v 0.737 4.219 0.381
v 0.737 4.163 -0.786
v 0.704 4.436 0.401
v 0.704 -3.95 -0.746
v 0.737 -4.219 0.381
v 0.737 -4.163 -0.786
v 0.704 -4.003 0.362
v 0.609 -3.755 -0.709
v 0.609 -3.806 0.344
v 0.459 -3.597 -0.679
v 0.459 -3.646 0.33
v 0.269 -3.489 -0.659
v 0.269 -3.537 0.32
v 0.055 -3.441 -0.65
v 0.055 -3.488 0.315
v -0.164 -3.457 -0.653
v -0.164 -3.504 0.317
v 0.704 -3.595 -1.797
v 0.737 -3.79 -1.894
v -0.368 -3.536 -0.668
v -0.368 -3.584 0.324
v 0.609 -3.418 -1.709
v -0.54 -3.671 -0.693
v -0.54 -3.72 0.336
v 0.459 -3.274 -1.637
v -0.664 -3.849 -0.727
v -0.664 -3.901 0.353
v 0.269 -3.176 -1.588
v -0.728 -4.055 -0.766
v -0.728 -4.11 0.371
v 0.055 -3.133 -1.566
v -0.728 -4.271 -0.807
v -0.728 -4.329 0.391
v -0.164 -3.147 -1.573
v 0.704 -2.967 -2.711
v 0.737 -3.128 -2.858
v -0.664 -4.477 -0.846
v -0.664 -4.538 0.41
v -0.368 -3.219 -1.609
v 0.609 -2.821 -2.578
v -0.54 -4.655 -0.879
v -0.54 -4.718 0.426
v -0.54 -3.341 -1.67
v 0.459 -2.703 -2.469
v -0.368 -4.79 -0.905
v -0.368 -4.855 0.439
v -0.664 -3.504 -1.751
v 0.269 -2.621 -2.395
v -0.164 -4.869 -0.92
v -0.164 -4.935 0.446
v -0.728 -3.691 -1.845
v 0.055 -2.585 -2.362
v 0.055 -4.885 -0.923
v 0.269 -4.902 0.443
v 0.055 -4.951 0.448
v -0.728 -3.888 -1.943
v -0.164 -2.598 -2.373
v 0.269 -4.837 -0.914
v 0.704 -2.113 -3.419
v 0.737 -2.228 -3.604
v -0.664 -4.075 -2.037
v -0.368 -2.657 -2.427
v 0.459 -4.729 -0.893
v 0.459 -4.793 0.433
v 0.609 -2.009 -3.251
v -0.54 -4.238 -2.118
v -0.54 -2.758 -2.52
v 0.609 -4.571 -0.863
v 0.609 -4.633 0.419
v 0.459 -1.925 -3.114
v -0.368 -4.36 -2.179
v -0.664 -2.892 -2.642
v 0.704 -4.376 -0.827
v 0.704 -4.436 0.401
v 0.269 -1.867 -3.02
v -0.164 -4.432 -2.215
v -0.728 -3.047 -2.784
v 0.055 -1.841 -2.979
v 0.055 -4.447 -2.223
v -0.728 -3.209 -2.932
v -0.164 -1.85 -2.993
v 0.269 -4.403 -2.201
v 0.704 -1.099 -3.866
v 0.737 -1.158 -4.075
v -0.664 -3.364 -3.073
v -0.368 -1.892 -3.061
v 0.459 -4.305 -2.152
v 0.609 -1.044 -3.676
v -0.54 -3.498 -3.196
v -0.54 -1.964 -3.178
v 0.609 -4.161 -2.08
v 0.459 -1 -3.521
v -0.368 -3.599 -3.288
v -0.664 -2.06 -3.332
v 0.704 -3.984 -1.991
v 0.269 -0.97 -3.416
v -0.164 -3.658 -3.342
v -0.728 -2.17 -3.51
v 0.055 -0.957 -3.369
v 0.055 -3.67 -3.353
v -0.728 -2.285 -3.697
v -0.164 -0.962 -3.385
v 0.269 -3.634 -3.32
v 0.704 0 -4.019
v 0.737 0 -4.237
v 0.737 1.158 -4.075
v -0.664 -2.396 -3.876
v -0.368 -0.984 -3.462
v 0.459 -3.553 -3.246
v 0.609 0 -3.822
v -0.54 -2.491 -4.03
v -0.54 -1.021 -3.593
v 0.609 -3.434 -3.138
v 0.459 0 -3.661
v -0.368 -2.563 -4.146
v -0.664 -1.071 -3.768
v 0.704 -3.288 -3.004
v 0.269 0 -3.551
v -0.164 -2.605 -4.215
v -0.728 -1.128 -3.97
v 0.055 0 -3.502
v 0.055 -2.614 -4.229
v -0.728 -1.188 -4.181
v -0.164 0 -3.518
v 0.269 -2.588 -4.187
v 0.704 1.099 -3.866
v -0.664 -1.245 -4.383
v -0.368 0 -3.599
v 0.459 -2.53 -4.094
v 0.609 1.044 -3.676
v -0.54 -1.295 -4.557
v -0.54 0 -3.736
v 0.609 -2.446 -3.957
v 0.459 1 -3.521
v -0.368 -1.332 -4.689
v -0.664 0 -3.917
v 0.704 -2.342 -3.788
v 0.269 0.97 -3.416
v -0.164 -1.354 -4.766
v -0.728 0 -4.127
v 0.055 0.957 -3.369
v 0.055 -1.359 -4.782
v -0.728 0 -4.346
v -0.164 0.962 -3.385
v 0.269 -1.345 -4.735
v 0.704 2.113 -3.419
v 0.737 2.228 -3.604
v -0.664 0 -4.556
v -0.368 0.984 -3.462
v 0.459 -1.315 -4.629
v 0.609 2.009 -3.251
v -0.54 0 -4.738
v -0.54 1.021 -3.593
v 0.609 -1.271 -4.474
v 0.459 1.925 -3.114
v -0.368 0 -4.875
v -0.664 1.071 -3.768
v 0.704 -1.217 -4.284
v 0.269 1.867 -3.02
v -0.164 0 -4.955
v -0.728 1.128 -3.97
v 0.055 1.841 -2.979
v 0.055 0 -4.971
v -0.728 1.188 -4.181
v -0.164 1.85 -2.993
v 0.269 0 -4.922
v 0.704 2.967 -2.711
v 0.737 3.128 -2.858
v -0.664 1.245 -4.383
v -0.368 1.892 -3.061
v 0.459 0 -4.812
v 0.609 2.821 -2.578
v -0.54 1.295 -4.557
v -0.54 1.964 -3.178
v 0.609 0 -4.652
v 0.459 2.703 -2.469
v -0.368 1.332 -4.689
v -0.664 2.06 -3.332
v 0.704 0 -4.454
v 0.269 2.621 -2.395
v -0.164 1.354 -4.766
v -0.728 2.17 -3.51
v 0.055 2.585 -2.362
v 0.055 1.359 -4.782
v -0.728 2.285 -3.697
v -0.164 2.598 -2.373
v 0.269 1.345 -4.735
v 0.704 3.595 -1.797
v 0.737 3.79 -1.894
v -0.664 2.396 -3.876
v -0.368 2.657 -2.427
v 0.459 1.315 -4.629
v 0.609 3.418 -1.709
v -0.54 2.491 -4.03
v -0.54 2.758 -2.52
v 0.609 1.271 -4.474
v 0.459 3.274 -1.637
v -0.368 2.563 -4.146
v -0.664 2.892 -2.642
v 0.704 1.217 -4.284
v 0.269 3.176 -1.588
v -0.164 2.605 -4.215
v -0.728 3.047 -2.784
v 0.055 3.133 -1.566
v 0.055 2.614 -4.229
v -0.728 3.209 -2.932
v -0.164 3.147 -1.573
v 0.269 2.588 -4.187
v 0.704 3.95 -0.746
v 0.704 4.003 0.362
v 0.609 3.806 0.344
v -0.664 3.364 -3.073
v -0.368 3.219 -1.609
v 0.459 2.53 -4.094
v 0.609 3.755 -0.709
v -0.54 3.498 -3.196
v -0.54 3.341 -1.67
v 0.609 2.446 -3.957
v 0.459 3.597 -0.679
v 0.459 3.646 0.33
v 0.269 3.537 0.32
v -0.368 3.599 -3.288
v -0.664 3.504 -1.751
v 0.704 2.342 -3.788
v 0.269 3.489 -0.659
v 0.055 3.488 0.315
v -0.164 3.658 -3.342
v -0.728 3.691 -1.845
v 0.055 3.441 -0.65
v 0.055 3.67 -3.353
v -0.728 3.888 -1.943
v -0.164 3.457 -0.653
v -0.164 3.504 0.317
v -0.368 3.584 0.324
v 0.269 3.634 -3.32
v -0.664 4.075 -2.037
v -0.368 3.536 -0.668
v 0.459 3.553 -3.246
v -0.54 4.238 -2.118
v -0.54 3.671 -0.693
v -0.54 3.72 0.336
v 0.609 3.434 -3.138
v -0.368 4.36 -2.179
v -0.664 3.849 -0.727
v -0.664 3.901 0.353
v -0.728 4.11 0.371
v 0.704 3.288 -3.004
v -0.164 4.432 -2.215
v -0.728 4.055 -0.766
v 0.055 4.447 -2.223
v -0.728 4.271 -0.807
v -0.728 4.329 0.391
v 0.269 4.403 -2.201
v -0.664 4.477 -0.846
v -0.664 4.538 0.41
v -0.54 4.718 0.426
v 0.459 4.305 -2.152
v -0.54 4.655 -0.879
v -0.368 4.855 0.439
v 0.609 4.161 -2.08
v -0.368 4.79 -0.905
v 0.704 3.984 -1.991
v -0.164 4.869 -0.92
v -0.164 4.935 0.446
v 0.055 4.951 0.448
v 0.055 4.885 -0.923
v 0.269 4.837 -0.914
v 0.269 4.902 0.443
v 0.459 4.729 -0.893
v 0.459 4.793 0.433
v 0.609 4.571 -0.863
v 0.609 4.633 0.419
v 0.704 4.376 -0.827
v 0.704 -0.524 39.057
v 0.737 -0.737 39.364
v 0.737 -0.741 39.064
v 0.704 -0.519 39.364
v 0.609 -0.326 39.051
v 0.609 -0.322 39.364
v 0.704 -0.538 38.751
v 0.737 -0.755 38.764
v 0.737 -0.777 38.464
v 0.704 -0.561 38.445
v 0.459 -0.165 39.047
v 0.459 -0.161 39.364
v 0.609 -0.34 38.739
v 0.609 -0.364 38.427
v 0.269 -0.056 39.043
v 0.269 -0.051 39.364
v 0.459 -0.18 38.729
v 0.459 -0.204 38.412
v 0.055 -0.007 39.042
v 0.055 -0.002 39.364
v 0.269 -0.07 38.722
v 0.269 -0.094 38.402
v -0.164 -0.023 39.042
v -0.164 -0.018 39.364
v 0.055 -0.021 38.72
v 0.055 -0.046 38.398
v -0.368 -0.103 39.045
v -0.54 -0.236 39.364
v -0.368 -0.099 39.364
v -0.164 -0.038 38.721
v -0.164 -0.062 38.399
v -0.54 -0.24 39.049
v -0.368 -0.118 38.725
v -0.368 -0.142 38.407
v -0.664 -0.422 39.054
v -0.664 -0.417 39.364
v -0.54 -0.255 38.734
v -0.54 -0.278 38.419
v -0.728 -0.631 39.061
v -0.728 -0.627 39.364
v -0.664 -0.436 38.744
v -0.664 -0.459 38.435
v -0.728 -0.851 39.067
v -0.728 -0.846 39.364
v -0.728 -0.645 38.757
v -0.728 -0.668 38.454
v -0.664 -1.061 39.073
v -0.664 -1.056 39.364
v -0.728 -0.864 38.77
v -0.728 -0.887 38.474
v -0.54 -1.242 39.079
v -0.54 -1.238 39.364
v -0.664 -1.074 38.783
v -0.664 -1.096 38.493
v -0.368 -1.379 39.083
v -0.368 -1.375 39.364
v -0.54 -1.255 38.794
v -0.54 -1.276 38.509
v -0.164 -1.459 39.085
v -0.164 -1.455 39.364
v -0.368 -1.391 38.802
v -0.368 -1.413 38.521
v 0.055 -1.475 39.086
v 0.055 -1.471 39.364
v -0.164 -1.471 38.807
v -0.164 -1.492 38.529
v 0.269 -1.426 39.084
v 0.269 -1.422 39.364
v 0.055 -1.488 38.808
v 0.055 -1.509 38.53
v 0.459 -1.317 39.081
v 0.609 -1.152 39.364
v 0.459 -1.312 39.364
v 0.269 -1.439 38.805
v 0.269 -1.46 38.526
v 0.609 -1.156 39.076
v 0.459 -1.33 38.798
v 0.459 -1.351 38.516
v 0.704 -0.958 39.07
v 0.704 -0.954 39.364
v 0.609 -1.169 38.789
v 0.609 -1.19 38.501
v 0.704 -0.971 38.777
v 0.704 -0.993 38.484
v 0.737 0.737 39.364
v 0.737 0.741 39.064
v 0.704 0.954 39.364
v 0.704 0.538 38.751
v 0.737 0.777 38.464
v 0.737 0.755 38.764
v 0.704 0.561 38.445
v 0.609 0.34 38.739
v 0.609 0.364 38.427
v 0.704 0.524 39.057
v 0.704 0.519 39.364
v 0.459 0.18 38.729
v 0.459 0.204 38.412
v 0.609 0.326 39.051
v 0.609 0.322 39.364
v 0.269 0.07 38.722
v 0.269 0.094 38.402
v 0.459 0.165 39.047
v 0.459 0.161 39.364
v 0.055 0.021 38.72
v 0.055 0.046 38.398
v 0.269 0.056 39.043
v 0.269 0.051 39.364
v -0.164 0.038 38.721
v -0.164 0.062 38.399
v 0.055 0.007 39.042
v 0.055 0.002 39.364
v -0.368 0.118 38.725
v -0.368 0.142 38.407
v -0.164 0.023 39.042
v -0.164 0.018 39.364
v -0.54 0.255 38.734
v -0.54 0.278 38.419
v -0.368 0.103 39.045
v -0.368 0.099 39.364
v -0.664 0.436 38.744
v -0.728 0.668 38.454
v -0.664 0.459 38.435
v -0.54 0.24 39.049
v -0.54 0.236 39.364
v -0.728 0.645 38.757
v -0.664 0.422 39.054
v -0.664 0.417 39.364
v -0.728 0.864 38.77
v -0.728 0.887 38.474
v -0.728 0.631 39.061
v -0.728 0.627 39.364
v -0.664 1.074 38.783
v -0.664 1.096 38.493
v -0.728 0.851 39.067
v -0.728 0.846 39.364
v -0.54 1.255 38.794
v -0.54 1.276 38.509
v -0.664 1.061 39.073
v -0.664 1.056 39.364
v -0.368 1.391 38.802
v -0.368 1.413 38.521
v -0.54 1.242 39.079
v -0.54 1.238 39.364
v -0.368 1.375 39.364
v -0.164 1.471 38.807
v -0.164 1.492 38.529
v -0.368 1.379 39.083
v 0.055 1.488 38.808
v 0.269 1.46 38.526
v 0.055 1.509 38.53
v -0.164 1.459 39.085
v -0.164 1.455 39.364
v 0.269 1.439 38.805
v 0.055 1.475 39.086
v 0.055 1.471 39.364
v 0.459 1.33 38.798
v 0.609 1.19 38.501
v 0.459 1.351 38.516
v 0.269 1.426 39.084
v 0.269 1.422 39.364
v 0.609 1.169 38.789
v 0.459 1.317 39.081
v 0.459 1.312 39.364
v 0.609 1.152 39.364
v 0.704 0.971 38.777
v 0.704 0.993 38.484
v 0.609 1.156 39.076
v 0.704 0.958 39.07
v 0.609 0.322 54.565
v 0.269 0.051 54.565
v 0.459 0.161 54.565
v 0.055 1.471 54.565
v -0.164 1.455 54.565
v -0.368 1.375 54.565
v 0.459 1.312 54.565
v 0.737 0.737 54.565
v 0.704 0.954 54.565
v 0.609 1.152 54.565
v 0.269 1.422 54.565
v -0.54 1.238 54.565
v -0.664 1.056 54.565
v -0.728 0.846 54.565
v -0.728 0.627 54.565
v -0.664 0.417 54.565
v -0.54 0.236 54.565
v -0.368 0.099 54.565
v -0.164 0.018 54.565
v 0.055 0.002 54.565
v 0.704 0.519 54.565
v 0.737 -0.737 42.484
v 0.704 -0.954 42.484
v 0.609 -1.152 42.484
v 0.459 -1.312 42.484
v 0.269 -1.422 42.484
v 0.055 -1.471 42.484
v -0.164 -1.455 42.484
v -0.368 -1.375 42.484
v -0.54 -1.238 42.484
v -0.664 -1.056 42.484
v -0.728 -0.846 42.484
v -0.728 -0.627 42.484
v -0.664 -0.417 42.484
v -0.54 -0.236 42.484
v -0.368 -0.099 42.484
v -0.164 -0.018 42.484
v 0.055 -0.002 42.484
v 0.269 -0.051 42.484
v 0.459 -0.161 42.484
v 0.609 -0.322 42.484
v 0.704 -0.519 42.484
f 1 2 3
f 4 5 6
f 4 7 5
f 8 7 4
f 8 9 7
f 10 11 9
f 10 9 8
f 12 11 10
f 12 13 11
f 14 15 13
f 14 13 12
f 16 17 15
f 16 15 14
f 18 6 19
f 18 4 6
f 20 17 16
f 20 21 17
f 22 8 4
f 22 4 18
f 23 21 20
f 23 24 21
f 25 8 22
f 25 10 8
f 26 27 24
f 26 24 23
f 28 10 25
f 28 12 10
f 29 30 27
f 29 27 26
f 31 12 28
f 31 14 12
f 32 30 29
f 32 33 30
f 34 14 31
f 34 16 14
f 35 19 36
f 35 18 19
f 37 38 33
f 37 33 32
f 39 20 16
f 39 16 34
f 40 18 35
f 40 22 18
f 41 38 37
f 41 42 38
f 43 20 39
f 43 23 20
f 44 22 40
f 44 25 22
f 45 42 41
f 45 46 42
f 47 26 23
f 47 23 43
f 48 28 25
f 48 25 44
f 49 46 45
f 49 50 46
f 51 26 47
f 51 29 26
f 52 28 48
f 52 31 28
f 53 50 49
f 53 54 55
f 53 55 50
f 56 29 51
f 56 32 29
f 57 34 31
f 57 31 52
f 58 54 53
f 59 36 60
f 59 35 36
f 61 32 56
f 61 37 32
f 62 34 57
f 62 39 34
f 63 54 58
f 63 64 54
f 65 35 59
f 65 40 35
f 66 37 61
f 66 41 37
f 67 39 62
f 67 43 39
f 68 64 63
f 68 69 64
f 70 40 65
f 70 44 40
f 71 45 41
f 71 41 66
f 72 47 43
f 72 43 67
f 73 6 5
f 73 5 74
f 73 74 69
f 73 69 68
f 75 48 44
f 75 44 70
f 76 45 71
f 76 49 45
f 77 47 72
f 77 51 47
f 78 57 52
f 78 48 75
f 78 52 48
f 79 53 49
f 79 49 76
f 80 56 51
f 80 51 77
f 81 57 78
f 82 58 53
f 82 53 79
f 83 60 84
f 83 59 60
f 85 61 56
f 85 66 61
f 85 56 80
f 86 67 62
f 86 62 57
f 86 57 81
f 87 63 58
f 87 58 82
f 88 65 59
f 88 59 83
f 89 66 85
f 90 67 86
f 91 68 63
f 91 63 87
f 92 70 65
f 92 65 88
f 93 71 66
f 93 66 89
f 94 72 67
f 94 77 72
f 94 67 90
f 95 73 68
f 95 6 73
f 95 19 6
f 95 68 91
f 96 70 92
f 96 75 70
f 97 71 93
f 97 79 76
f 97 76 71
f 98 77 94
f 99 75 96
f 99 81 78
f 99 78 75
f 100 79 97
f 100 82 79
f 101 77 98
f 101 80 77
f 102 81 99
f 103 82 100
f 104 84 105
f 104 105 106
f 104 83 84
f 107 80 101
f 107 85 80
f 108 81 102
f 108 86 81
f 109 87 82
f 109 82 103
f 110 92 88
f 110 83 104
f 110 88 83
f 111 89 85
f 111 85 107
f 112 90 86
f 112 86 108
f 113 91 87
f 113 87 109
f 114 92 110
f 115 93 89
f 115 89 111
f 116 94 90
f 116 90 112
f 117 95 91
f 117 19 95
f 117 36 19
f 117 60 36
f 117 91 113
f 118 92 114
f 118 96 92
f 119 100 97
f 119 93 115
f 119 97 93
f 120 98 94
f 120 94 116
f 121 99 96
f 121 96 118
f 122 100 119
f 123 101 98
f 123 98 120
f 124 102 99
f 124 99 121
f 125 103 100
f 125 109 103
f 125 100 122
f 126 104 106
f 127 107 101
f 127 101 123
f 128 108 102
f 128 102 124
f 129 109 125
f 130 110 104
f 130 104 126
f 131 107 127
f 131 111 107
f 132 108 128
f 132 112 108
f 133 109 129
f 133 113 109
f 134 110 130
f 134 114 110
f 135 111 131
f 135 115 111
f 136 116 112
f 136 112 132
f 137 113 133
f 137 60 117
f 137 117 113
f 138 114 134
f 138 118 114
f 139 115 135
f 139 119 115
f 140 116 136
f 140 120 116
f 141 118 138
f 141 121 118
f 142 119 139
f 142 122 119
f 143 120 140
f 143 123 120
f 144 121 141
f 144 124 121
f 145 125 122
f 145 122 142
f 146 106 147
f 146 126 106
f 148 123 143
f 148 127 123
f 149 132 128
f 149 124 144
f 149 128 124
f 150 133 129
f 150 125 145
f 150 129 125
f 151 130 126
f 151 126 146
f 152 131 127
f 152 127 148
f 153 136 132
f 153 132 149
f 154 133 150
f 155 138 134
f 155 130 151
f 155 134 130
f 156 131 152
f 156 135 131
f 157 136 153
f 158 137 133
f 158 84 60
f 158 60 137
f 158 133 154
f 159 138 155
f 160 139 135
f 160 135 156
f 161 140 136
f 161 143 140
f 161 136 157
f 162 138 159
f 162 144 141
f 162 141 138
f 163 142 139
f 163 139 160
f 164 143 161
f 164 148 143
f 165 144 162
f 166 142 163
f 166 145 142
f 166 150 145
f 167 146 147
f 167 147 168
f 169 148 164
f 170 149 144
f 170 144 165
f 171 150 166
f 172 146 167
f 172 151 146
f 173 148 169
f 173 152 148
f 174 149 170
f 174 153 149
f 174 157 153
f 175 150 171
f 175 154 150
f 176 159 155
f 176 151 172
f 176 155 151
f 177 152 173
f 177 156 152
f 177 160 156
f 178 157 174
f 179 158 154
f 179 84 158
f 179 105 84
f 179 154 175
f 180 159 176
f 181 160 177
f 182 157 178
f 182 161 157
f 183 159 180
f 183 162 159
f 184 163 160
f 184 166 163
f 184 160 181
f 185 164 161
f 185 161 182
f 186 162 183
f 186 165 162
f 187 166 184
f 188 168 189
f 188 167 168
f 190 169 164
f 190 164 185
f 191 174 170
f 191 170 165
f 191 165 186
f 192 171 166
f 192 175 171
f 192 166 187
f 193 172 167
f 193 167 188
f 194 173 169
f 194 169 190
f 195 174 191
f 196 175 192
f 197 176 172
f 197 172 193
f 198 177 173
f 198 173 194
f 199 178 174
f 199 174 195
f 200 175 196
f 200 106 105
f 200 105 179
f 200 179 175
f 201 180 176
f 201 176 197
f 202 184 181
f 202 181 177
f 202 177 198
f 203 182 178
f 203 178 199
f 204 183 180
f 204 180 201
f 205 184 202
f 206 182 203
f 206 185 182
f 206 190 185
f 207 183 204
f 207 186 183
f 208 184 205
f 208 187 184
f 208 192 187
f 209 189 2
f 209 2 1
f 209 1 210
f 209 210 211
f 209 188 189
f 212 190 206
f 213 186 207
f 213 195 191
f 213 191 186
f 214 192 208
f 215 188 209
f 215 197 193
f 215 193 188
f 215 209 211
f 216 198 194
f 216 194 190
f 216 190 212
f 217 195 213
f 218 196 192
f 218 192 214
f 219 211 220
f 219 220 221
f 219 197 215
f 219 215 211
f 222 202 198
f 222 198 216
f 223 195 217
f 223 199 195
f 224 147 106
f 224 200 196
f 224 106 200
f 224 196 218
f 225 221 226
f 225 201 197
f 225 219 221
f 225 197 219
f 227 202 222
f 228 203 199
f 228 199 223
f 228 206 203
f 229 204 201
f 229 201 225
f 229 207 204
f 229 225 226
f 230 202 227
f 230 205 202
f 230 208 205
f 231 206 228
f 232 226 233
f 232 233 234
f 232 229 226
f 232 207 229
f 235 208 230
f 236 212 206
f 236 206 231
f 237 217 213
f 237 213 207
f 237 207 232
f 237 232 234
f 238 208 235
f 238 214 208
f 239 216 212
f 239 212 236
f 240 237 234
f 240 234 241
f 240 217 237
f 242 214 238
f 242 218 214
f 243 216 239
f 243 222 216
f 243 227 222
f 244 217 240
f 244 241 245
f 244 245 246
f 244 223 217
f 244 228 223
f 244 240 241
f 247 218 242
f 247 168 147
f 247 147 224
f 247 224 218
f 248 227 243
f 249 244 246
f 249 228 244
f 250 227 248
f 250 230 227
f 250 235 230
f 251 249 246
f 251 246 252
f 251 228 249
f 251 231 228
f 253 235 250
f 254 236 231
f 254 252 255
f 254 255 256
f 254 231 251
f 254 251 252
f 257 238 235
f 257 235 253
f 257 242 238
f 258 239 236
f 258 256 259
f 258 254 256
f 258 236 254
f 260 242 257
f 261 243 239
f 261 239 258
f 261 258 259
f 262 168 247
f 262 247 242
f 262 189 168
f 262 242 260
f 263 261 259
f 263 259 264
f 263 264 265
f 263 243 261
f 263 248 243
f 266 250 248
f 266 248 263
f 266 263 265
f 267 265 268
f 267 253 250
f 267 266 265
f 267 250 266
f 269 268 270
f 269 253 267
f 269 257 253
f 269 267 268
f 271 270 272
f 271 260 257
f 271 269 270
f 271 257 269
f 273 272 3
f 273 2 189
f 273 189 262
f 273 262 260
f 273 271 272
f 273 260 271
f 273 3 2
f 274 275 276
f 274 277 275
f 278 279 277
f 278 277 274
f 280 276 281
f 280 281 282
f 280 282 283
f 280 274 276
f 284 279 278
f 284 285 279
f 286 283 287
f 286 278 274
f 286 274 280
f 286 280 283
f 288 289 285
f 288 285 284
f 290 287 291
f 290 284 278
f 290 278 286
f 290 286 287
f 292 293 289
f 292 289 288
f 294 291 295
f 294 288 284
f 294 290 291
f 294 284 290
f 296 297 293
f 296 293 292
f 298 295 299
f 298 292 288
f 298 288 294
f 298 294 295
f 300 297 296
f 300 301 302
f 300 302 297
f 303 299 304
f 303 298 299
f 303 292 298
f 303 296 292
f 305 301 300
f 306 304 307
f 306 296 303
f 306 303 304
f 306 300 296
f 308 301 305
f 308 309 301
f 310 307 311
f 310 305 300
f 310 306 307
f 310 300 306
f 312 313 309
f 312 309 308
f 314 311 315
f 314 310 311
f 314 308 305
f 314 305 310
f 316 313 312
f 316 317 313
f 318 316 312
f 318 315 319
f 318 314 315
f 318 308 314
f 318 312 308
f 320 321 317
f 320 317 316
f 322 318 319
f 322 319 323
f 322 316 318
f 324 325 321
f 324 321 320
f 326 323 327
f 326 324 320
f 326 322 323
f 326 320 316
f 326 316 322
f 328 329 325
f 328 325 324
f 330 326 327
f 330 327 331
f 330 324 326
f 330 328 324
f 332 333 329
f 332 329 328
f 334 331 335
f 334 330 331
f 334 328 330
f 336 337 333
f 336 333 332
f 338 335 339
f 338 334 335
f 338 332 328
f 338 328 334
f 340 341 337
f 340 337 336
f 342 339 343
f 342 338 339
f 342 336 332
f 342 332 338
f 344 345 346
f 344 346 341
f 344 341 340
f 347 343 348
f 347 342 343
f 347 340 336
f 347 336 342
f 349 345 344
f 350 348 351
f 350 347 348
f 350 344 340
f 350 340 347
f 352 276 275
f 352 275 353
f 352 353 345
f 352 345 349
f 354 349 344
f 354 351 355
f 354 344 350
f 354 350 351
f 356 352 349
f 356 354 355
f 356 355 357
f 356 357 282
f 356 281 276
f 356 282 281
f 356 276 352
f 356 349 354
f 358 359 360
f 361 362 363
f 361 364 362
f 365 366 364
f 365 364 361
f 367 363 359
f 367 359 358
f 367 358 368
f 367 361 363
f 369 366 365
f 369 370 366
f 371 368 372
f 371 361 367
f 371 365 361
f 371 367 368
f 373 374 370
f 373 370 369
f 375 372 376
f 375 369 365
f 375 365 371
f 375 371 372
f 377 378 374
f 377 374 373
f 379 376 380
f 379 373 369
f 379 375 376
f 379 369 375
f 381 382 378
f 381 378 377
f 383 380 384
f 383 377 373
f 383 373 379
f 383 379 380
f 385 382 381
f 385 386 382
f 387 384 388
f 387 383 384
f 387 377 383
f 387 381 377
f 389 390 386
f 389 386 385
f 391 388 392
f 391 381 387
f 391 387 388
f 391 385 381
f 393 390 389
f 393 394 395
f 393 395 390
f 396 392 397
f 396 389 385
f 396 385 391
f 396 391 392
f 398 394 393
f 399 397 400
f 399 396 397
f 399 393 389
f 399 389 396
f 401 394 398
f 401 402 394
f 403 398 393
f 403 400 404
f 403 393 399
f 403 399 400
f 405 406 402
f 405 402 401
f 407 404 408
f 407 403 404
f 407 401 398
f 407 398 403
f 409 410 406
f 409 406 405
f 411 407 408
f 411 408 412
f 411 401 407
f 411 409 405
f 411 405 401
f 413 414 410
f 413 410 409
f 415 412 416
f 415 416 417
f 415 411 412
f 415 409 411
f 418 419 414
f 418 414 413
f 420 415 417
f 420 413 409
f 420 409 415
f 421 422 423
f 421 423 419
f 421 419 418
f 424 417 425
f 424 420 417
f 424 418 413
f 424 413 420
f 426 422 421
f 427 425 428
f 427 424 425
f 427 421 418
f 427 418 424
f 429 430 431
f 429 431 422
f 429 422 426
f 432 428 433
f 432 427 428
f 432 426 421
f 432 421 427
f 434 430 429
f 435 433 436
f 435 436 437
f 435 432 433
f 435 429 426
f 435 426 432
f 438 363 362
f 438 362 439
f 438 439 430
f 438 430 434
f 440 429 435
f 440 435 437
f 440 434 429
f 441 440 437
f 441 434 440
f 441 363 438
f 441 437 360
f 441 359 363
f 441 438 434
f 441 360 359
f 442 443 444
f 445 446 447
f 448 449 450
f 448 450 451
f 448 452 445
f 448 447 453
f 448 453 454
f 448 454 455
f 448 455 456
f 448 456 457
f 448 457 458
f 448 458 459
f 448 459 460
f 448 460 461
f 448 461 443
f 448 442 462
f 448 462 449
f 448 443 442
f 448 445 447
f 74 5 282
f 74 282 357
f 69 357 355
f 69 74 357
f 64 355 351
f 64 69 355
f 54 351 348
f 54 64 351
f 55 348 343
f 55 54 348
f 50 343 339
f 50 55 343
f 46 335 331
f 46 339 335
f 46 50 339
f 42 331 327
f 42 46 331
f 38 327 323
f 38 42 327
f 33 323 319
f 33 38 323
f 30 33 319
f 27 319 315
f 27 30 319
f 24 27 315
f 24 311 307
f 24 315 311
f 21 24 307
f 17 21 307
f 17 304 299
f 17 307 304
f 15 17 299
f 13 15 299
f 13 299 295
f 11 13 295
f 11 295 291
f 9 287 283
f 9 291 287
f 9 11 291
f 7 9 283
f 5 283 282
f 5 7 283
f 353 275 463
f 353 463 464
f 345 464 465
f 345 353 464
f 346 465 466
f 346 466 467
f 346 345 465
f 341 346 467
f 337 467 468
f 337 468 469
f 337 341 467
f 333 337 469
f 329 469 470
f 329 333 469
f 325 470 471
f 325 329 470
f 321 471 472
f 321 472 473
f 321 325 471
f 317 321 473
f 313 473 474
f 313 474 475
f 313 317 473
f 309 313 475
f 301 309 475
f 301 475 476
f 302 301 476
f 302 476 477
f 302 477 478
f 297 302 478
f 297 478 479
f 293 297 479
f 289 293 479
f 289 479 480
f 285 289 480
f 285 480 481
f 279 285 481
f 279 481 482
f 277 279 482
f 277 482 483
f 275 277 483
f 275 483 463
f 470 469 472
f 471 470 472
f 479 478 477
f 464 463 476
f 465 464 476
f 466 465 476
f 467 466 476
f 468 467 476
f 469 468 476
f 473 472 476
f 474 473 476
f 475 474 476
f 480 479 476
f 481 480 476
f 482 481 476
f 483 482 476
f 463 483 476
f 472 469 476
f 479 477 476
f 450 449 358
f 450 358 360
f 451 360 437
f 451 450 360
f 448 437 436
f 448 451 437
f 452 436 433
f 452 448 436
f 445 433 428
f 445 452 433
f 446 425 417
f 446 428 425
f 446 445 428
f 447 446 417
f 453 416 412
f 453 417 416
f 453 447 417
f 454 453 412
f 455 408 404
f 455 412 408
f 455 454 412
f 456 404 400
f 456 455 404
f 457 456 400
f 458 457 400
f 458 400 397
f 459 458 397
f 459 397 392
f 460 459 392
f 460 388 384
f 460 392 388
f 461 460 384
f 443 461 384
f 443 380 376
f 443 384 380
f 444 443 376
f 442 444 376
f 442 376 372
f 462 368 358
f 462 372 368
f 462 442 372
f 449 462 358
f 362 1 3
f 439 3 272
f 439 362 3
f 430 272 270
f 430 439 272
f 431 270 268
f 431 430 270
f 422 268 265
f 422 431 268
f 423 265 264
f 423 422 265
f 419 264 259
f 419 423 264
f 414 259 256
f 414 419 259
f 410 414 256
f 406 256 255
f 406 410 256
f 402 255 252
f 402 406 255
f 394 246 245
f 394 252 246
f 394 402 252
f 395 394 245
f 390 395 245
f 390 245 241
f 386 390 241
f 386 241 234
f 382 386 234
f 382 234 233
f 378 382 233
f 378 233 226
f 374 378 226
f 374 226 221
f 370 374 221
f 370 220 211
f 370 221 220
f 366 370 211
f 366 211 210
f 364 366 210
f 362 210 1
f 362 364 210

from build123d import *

# Parameters (mm, degrees)
SKETCH2_R = 0.7366


with BuildPart() as part:
    # Sweep1: sweep along a path in Sketch1
    with BuildLine(Plane(origin=(0, 0, 0), x_dir=(0, 0, -1), z_dir=(1, 0, 0))) as sweep1_path:
        Line((-42.483763873, -0.7366), (-39.364266321, -0.7366))
        ThreePointArc((-39.364266321, -0.7366), (-38.913706182, -0.746755379), (-38.464061165, -0.777200888))
        Line((-38.464061165, -0.777200888), (-0.381380916, -4.219399028))
        ThreePointArc((-0.381380916, -4.219399028), (4.2366, 0), (-0.381380916, 4.219399028))
        Line((-0.381380916, 4.219399028), (-38.464061165, 0.777200888))
        ThreePointArc((-38.464061165, 0.777200888), (-38.913706182, 0.746755379), (-39.364266321, 0.7366))
        Line((-39.364266321, 0.7366), (-42.483763873, 0.7366))
        Line((-42.483763873, 0.7366), (-54.56460022, 0.7366))
    # Sketch2 → Sweep1 (sweep)
    with BuildSketch(Plane.XY.offset(54.56460022)):
        with Locations((0, 0.7366)):
            Circle(SKETCH2_R)
    sweep(path=sweep1_path.line)


solid = part.part
